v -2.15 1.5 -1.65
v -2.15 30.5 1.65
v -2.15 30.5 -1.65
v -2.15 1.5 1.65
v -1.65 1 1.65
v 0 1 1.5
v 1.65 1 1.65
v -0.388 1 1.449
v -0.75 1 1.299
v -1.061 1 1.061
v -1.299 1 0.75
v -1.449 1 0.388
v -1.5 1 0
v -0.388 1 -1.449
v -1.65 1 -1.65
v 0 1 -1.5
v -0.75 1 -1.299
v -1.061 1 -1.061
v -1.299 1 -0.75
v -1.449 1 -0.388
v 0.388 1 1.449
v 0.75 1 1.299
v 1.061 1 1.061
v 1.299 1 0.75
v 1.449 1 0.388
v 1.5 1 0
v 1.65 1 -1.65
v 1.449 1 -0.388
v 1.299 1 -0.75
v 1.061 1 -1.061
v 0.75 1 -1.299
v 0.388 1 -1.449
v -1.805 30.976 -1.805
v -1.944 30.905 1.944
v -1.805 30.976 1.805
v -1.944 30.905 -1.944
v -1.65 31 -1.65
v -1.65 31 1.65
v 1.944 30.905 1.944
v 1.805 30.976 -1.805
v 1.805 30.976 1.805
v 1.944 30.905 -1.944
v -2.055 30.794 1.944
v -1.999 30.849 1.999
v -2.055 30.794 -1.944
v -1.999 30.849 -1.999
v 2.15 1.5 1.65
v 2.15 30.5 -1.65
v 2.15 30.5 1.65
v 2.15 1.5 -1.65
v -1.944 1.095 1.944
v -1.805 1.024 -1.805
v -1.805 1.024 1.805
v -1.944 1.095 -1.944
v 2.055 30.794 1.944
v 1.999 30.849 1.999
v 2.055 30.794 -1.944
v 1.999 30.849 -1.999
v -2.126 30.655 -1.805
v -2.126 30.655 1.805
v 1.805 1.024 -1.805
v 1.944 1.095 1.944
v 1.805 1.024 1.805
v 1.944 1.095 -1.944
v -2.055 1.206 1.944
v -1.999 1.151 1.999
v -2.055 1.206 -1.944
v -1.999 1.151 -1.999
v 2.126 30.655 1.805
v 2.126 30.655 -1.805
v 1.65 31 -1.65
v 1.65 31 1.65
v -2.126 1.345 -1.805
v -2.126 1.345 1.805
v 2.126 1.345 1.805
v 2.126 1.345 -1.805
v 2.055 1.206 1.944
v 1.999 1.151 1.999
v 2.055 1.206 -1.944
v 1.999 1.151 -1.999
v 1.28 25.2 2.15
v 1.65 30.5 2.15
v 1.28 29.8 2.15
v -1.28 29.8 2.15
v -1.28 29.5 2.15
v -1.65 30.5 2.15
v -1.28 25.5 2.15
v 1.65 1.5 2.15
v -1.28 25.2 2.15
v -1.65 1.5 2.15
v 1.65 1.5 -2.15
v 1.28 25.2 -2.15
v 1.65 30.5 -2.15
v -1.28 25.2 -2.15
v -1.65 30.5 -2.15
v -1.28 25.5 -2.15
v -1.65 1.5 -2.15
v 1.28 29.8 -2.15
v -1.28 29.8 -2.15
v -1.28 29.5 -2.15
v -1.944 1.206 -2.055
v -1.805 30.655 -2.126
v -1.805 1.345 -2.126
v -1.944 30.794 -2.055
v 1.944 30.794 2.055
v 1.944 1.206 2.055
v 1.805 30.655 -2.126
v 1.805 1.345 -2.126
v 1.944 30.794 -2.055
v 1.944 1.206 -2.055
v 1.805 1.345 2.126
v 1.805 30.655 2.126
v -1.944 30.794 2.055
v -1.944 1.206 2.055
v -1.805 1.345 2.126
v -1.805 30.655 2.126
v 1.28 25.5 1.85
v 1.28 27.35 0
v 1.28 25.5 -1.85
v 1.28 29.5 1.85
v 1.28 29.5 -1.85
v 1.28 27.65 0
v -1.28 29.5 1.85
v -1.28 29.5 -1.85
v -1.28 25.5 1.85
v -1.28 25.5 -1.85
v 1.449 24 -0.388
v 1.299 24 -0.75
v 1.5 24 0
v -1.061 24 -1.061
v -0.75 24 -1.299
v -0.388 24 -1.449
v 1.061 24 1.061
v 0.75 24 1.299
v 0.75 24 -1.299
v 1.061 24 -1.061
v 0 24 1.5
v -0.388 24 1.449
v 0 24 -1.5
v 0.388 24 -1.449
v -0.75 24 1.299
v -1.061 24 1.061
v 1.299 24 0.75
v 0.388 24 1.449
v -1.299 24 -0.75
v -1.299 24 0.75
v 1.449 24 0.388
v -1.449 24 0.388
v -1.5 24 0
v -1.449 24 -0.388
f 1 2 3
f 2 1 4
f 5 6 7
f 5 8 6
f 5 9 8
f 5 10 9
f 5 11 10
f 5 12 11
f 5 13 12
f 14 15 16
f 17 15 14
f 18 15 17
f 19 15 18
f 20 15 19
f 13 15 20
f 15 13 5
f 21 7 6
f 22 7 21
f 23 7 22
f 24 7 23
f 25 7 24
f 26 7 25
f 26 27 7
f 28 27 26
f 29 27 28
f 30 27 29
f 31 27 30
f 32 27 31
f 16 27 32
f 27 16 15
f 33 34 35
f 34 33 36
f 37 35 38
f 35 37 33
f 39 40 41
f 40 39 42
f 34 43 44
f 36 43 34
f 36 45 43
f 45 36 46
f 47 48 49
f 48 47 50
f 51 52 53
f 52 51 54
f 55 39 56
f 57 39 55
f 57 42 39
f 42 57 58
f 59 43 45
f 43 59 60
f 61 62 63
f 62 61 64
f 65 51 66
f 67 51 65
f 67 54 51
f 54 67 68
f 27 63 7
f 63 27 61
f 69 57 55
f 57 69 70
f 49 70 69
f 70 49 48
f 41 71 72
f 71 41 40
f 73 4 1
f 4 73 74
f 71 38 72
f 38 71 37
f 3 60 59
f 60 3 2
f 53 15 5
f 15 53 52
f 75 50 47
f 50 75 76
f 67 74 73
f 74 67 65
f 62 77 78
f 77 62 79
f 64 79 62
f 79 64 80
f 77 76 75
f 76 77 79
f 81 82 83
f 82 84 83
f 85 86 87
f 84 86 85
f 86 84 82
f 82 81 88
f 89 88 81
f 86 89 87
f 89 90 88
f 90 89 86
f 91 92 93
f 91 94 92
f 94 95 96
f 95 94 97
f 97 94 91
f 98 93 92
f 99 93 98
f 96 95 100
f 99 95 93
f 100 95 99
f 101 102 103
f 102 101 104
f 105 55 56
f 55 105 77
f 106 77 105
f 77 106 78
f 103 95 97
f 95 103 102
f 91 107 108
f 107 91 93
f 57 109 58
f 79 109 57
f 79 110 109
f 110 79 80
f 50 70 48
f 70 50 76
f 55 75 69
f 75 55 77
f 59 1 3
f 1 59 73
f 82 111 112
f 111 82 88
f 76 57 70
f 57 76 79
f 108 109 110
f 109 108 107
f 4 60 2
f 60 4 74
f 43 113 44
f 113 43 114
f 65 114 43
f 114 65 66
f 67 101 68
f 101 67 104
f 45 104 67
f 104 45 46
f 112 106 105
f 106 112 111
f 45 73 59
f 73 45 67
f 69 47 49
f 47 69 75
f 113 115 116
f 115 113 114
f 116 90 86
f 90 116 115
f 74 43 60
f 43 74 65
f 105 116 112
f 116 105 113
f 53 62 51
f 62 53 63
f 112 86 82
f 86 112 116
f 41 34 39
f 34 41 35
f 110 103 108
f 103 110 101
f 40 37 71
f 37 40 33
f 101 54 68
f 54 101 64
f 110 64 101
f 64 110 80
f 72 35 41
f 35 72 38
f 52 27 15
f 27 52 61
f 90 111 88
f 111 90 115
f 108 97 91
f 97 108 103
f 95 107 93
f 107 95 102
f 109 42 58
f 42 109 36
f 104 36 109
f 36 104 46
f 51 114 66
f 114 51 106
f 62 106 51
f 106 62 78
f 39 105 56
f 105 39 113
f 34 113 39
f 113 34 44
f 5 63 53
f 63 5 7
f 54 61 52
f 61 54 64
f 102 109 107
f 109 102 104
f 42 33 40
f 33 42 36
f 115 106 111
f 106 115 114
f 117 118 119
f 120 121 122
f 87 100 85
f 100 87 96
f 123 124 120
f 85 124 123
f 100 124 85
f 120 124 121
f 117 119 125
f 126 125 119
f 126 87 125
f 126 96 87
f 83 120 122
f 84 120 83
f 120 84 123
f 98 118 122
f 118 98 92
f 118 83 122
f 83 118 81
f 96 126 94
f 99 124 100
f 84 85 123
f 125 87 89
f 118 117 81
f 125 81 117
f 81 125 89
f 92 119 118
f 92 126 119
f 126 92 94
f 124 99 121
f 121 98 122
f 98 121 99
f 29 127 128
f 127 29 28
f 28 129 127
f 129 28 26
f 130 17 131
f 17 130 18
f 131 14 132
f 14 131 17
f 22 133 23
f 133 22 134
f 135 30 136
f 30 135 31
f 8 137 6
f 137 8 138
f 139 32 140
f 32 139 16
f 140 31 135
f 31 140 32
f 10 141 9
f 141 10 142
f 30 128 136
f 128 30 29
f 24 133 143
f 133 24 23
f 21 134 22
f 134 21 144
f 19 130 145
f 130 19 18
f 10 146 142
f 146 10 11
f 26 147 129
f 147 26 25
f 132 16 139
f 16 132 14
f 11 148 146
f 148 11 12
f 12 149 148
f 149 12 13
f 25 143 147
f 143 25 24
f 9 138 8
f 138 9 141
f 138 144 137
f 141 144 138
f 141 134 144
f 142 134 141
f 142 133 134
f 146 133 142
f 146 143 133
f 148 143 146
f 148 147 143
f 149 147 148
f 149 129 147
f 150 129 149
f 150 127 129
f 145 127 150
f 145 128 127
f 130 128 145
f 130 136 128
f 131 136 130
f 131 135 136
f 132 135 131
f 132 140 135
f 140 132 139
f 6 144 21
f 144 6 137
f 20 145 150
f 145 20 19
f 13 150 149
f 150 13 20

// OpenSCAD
scale=100; // [90:170]

vs=scale/100.0;

module roundedcube(xdim,ydim,zdim,rdim) {
    intersection() {
        hull() {
            translate([rdim,rdim,0]) cylinder(h=zdim,r=rdim,$fn=20);
            translate([xdim-rdim,rdim,0]) cylinder(h=zdim,r=rdim,$fn=20);
            translate([rdim,ydim-rdim,0]) cylinder(h=zdim,r=rdim,$fn=20);
            translate([xdim-rdim,ydim-rdim,0]) cylinder(h=zdim,r=rdim,$fn=20);
        }
        hull() {
            translate([0,ydim,0]) rotate(90, [1,0,0]) {
                translate([rdim,rdim,0]) cylinder(h=ydim,r=rdim,$fn=20);
                translate([xdim-rdim,rdim,0]) cylinder(h=ydim,r=rdim,$fn=20);
                translate([rdim,zdim-rdim,0]) cylinder(h=ydim,r=rdim,$fn=20);
                translate([xdim-rdim,zdim-rdim,0]) cylinder(h=ydim,r=rdim,$fn=20);
            }
        }
        hull() {
            translate([0,0,zdim]) rotate(90, [0,1,0]) {
                translate([rdim,rdim,0]) cylinder(h=xdim,r=rdim,$fn=20);
                translate([zdim-rdim,rdim,0]) cylinder(h=xdim,r=rdim,$fn=20);
                translate([rdim,ydim-rdim,0]) cylinder(h=xdim,r=rdim,$fn=20);
                translate([zdim-rdim,ydim-rdim,0]) cylinder(h=xdim,r=rdim,$fn=20);
            }
        }
    }
}

difference() {
    translate([0, 1, 0]) {
        scale([vs,vs,vs]) {
            translate([-2.15, 0, -2.15]) {
                difference() {
                    roundedcube(4.3, 30, 4.3, 0.5);
                    translate([(4.3-2.56)/2, (30-1.5-4), -2]) {
                        cube([2.56, 4, 8]);
                    }
                }
            }
        }
    }
    rotate(-90, [1,0,0]) { 
        cylinder(h=24, r=1.5, $fs=0.4);
    }
    translate([0, 1, 0]) {
        scale([vs,vs,vs]) {
            translate([(-2.56)/2, (30-2-1.5), -0.15]) {
                rotate(45, [1,0,0]) cube([2.56, 8, 8]);
            }
            translate([(-2.56)/2, (30-2-1.5), +0.15]) {
                rotate(45+180, [1,0,0]) cube([2.56, 8, 8]);
            }
        }
    }
}
